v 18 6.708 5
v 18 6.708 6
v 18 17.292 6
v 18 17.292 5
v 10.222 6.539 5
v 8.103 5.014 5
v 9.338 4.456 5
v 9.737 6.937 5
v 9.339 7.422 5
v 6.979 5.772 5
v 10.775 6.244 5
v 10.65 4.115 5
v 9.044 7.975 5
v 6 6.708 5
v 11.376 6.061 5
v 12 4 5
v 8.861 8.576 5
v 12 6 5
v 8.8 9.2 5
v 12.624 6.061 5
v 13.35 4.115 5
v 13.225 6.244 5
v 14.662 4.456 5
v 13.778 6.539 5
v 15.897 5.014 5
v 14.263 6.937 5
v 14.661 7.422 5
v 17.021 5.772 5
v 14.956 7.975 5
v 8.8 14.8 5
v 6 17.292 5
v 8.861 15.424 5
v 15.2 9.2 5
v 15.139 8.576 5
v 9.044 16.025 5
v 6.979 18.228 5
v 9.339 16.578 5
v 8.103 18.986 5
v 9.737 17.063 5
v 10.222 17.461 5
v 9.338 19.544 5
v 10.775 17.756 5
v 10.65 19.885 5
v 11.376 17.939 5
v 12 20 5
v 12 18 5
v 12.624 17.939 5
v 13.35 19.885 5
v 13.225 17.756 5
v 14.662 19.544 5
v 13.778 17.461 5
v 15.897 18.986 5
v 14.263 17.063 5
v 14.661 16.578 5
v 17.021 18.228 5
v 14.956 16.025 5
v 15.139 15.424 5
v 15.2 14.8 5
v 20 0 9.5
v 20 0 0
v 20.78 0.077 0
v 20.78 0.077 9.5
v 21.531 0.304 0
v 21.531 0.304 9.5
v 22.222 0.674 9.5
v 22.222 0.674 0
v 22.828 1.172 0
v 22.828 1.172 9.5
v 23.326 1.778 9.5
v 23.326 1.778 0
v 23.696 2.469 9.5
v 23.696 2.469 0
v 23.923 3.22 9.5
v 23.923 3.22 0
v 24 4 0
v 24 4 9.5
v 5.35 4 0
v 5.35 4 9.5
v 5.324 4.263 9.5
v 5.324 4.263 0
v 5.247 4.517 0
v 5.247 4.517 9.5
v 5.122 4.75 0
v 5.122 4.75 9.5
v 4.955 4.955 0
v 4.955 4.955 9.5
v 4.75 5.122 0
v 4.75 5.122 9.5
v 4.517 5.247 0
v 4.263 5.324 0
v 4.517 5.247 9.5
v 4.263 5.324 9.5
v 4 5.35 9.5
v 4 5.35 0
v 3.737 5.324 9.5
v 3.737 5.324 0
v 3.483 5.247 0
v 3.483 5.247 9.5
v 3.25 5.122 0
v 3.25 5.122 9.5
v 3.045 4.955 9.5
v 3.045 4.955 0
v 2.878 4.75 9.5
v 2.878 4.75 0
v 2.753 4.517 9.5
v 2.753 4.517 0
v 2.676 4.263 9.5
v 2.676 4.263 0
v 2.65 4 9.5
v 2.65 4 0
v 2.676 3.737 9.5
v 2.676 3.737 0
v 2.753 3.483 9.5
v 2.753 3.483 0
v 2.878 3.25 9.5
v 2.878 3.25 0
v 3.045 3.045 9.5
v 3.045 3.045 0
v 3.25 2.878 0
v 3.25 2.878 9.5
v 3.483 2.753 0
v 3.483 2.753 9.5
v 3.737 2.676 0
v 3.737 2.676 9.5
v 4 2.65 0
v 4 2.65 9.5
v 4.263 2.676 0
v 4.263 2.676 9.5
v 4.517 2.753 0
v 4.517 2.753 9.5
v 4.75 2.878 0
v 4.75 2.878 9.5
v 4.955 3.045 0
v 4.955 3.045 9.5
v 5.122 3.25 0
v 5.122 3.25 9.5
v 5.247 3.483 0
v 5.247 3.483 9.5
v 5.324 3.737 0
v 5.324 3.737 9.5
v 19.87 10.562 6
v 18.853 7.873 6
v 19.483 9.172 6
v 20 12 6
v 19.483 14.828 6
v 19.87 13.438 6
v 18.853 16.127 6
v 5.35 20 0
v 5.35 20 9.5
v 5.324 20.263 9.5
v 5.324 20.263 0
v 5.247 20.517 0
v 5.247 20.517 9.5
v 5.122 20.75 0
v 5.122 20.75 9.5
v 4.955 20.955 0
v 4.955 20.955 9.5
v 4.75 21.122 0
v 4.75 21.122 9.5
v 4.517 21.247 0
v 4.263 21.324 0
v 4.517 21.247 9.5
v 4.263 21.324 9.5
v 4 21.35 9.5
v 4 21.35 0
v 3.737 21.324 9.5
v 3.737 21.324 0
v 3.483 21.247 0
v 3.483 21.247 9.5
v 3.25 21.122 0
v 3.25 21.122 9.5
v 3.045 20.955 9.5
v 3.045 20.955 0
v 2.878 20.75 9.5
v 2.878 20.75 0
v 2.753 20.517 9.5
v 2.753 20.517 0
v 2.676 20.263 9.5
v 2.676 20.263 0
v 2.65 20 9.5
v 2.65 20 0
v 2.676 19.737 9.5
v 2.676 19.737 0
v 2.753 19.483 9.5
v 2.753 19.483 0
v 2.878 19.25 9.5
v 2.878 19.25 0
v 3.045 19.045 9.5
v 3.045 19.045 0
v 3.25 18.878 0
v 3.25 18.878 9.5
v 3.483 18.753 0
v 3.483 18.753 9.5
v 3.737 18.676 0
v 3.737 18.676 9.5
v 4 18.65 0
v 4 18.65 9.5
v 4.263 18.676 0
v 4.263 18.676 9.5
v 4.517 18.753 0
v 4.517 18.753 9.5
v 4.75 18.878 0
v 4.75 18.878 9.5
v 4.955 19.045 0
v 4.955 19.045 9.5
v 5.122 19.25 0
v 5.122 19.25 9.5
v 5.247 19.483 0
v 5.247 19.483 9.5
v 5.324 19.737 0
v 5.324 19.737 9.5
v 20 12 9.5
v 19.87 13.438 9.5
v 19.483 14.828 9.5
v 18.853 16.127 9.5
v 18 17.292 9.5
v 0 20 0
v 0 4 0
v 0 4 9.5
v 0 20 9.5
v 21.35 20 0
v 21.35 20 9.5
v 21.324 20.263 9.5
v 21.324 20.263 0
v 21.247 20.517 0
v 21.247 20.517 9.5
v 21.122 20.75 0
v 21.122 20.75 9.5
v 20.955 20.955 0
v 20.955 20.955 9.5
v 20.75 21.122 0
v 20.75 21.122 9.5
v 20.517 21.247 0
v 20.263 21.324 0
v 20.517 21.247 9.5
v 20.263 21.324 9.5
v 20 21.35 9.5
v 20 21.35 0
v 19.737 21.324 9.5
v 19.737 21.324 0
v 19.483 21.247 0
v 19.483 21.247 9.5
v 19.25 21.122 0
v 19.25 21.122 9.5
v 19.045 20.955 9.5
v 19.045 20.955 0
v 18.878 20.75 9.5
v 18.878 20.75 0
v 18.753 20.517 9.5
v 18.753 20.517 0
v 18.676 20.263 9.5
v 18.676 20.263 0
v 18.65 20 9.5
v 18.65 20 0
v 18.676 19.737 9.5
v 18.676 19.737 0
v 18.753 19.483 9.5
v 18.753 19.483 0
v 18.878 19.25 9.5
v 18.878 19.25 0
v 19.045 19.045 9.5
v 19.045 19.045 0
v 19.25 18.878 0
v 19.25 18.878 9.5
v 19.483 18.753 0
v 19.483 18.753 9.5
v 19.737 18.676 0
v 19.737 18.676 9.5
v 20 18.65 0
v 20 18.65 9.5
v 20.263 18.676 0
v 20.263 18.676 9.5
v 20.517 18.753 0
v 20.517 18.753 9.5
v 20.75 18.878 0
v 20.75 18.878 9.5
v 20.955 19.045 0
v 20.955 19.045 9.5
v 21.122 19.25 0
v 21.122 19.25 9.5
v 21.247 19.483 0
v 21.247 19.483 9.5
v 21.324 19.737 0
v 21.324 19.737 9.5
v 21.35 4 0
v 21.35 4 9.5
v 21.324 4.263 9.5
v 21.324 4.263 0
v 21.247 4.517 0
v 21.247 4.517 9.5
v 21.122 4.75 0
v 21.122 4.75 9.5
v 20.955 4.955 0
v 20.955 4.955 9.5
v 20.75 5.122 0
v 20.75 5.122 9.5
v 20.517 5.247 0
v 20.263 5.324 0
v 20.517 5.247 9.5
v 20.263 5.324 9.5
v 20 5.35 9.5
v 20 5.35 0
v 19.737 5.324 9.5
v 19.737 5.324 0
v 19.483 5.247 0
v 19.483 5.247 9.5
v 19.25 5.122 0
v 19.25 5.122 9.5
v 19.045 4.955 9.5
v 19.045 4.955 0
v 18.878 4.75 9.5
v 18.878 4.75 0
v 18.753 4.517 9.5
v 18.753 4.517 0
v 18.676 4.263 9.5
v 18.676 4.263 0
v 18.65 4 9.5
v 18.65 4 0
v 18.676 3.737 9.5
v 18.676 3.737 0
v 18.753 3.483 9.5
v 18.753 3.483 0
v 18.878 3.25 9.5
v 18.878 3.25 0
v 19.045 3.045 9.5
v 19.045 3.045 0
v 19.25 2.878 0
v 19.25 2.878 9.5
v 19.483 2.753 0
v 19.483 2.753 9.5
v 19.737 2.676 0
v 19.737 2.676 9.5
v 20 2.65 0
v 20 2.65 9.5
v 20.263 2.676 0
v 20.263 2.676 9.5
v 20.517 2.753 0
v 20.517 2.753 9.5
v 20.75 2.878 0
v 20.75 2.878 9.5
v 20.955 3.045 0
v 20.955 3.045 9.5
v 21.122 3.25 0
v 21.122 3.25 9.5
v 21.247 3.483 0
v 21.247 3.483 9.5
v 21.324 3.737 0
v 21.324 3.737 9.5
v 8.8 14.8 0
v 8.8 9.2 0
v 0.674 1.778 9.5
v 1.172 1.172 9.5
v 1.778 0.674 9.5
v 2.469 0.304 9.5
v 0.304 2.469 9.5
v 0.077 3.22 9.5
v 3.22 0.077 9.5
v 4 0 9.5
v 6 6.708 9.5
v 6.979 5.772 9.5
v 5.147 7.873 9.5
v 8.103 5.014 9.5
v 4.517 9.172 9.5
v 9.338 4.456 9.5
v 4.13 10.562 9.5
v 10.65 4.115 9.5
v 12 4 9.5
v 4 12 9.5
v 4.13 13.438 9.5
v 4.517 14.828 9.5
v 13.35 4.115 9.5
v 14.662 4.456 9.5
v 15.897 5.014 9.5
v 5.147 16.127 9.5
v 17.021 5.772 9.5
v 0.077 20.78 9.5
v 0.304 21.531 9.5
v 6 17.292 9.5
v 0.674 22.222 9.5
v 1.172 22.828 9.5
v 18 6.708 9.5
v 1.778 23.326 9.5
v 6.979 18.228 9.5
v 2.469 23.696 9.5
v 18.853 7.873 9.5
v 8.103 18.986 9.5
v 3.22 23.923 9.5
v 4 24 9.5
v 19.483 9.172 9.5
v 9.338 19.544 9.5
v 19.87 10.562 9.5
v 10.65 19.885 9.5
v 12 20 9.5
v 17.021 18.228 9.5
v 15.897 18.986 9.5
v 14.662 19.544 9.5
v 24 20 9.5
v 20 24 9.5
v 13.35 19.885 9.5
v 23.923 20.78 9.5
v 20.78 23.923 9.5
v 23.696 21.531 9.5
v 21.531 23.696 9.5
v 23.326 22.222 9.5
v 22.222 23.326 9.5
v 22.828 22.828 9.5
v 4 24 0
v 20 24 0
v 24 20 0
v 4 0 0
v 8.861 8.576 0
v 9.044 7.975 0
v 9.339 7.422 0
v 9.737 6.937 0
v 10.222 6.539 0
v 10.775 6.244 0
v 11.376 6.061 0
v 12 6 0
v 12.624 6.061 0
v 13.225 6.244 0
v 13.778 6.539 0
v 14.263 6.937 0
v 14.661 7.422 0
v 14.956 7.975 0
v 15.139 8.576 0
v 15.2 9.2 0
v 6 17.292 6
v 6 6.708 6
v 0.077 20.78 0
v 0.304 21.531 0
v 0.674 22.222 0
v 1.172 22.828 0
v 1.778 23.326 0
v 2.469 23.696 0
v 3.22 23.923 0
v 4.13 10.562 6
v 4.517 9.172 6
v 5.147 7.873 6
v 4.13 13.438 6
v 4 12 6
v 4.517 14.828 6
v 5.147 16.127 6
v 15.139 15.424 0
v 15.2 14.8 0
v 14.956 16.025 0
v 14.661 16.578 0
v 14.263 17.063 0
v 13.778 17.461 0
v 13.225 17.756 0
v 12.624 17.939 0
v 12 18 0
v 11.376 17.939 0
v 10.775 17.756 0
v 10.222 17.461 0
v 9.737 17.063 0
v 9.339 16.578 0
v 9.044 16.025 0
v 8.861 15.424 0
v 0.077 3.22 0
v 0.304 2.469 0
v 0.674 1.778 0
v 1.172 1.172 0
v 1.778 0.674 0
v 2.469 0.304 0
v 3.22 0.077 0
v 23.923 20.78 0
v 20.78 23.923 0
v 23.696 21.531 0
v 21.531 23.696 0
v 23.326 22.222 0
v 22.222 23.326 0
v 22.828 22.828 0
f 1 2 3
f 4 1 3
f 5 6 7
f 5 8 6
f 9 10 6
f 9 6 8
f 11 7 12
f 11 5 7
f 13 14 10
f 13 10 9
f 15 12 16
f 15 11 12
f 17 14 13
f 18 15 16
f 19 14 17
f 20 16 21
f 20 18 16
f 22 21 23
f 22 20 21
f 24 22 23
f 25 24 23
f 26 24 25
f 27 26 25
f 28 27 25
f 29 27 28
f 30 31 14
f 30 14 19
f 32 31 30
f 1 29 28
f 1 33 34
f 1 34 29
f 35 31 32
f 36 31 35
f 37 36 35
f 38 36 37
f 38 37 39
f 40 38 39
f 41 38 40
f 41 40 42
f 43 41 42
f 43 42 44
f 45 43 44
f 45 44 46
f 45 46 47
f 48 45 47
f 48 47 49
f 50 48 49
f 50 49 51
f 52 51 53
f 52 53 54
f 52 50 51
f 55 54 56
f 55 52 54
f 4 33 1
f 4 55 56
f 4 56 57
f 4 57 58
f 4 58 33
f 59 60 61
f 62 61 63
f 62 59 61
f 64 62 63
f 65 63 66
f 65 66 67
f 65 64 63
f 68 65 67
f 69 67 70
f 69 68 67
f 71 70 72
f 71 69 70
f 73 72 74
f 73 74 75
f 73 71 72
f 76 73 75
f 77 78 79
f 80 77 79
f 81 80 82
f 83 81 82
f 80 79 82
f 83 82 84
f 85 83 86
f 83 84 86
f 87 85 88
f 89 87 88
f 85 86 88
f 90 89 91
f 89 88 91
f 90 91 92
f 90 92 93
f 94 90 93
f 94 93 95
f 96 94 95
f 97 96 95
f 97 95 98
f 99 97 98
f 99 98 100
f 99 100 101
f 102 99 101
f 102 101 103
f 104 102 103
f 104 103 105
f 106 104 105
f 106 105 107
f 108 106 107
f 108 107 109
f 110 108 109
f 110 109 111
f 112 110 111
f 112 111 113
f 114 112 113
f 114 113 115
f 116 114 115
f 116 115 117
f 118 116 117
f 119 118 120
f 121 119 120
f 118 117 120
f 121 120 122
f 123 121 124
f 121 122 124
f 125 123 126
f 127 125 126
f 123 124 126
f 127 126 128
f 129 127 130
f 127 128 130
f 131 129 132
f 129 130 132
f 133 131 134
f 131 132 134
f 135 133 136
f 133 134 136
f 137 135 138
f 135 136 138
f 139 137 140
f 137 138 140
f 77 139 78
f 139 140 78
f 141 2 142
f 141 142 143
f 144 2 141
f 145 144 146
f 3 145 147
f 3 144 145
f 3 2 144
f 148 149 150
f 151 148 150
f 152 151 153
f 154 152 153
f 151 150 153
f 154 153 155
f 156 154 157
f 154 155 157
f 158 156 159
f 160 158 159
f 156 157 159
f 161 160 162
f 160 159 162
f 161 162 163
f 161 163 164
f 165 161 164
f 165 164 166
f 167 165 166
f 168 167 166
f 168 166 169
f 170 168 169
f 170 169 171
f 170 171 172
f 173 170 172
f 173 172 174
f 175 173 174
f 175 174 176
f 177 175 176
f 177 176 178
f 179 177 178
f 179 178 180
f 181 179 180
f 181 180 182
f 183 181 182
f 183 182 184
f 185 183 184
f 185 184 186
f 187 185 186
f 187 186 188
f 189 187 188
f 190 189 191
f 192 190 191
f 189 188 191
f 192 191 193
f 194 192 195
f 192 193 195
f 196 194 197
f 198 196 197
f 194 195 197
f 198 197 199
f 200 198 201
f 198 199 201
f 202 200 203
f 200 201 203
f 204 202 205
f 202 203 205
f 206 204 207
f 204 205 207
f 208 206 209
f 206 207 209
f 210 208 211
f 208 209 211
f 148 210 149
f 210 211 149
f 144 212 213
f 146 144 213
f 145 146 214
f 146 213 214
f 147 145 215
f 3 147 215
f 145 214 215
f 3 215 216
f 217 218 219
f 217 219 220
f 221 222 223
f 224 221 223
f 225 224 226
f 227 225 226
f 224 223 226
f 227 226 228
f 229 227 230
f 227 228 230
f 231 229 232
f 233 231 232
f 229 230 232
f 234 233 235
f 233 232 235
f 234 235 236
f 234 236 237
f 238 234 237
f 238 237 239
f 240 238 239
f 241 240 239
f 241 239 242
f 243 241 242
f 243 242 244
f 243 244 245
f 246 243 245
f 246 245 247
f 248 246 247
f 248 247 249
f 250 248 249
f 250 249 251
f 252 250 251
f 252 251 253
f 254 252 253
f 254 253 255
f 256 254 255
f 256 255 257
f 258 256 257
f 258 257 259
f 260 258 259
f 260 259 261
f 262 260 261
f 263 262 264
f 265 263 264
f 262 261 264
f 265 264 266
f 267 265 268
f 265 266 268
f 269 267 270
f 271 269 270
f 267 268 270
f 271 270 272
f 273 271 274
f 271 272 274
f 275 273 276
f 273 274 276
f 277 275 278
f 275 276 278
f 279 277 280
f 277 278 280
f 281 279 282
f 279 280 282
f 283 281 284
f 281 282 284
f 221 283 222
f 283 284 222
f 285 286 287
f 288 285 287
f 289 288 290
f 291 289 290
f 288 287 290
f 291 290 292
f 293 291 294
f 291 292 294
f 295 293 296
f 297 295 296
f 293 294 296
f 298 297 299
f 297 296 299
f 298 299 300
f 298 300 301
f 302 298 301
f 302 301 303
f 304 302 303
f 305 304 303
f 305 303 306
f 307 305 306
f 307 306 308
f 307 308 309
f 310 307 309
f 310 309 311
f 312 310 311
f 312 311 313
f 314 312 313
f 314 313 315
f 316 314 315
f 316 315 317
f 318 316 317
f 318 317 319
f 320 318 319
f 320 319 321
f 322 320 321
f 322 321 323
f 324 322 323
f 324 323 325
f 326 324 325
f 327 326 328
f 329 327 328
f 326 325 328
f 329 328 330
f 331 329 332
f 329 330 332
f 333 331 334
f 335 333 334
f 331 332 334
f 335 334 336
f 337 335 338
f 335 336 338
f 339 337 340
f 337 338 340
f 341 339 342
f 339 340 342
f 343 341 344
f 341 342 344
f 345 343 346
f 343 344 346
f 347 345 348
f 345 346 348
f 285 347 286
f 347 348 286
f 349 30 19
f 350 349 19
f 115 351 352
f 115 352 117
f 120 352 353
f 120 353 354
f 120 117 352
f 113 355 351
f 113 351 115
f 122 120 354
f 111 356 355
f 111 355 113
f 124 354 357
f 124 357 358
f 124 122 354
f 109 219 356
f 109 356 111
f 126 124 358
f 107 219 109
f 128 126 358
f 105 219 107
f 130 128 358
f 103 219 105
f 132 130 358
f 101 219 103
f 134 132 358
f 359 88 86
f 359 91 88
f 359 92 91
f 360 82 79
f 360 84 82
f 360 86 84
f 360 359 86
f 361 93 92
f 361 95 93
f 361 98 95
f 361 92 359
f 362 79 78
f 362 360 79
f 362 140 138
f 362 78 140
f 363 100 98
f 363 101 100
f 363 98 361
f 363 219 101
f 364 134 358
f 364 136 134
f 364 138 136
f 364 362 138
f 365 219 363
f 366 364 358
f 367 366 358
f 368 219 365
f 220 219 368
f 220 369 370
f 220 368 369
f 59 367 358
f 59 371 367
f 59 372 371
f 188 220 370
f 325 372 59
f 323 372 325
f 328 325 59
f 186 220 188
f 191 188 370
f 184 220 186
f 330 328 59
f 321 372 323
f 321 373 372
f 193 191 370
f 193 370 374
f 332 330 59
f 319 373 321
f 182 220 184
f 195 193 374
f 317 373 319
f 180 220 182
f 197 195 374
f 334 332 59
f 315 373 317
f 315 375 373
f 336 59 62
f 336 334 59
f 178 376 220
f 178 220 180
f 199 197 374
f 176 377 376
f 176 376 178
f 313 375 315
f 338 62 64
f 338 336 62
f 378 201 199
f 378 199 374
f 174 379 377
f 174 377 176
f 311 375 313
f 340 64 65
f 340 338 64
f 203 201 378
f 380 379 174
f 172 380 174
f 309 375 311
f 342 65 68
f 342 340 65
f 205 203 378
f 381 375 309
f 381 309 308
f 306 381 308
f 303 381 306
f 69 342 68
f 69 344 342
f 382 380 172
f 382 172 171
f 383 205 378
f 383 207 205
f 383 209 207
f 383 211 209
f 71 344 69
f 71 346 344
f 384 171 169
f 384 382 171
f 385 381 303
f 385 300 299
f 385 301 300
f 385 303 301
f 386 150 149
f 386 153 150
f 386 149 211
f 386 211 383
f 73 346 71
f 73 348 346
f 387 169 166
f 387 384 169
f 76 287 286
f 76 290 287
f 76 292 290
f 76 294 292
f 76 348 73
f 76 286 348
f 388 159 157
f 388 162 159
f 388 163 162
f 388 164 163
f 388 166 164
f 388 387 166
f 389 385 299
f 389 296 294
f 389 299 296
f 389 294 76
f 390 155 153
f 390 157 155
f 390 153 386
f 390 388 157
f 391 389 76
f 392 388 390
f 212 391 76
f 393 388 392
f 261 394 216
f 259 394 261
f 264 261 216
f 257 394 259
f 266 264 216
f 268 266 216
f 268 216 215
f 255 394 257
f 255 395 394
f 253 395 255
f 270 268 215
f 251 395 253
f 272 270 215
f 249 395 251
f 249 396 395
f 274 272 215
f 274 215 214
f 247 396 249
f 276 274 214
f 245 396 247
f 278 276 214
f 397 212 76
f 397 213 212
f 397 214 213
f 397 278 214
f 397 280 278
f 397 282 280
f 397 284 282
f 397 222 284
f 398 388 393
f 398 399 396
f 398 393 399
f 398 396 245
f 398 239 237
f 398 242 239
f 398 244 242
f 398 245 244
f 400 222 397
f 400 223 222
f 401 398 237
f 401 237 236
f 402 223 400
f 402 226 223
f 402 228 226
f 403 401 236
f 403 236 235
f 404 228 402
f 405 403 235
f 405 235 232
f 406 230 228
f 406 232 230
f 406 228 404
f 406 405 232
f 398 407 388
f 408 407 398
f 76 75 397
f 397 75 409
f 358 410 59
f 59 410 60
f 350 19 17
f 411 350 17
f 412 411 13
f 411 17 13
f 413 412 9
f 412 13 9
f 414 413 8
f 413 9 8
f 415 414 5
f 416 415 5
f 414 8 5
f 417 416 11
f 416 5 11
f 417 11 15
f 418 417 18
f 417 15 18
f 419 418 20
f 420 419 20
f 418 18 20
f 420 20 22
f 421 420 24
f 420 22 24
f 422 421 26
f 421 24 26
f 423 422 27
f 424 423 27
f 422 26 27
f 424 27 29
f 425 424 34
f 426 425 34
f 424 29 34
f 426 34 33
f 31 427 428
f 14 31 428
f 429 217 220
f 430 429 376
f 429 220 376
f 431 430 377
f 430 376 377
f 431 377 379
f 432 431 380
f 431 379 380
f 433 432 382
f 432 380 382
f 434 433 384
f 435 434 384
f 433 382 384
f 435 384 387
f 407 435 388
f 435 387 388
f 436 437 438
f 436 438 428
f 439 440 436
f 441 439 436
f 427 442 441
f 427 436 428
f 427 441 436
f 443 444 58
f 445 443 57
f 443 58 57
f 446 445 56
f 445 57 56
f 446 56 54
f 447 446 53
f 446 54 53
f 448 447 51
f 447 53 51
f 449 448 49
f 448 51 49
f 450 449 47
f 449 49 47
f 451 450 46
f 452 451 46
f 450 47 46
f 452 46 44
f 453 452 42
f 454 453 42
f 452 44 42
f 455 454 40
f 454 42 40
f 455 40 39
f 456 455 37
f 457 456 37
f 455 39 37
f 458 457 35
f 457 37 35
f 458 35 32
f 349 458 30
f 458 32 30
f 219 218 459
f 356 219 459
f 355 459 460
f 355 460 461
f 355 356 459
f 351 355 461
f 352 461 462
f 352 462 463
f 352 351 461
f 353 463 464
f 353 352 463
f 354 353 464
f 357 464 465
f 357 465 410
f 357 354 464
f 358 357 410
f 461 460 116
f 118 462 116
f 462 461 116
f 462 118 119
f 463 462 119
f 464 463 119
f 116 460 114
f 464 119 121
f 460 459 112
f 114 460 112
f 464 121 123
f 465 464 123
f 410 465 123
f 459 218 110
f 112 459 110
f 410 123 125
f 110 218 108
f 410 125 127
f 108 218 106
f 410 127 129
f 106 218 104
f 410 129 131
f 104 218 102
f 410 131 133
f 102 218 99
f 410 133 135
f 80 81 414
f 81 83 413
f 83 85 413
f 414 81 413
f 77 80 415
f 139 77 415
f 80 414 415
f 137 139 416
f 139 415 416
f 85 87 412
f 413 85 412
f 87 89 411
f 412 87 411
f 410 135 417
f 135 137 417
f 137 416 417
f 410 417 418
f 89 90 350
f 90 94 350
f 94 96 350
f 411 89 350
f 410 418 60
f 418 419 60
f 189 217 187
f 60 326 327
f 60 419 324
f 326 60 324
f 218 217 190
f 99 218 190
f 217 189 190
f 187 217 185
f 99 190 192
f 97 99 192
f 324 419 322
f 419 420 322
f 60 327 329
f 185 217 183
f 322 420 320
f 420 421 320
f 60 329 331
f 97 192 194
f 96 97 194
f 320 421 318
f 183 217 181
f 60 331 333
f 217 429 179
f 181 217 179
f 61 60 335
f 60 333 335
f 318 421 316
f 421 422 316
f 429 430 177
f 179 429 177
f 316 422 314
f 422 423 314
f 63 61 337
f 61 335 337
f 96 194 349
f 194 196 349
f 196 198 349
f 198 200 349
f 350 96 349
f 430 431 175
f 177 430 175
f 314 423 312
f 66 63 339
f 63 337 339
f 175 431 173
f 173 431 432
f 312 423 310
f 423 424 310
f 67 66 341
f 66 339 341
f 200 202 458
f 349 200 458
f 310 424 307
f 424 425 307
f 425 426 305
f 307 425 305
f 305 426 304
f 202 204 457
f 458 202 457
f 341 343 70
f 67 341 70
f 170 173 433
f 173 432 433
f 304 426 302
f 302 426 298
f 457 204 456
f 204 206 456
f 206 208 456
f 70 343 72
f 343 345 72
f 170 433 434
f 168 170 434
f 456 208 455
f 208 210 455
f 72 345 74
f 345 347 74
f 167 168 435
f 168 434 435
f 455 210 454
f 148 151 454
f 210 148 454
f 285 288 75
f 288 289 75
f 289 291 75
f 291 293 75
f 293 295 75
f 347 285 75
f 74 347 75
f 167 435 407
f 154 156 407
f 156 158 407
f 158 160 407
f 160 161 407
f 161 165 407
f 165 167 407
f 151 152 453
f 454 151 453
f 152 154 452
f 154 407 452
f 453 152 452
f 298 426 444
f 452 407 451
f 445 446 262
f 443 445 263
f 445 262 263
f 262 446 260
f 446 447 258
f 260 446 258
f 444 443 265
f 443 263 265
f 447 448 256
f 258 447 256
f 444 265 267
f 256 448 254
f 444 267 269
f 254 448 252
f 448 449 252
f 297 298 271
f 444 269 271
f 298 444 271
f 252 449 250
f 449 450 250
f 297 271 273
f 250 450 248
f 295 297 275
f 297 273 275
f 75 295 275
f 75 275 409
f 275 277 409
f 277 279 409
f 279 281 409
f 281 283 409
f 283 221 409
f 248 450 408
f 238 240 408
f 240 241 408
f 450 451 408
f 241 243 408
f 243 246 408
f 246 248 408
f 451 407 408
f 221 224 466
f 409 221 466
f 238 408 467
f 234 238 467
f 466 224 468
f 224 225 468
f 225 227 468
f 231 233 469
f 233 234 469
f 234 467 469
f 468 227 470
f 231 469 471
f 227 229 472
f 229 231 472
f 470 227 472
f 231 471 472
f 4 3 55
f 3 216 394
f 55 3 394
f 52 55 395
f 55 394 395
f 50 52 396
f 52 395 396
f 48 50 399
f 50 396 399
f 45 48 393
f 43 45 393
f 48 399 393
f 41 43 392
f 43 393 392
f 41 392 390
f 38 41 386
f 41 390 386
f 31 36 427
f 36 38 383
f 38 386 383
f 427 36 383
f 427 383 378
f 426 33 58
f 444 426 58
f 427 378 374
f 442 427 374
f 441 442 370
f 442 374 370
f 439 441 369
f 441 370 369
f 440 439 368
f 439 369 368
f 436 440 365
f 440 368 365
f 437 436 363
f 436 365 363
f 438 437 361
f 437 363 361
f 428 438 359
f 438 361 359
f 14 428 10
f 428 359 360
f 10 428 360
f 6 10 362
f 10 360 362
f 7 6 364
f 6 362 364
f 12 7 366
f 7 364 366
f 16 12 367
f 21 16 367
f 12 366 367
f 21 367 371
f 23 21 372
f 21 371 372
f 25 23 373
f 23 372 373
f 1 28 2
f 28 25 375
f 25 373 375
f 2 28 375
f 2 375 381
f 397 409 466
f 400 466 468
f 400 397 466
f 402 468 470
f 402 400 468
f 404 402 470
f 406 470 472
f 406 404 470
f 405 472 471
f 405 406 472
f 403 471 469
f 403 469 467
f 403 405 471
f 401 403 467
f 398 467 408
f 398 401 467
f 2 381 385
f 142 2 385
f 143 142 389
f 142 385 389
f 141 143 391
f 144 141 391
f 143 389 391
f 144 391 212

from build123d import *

# Parameters (mm, degrees)
F0_W      = 24
F0_H      = 24
F1_DEPTH  = 9.5
F4_R      = 4
F7_DEPTH  = 9.501
F8_DEPTH  = 4.5
F9_DEPTH  = 3.5
F5_R      = 1.35
F10_DEPTH = 9.501


with BuildPart() as f1:
    # F0 (on Top) → F1 (new body)
    with BuildSketch(Plane.XY):
        with Locations((12, 12)):
            Rectangle(F0_W, F0_H)
    extrude(amount=F1_DEPTH)

    # F4
    f4_edges = [f1.edges().sort_by_distance(p)[0] for p in [
        (0, 0, 4.75),
        (24, 0, 4.75),
        (24, 24, 4.75),
        (0, 24, 4.75),
    ]]
    fillet(f4_edges, radius=F4_R)

    # F6 (on face) → F7 (cut, through all)
    with BuildSketch(Plane.XY.offset(9.5)):
        with BuildLine():
            ThreePointArc((15.2, 14.8), (12, 18), (8.8, 14.8))
            Line((8.8, 14.8), (8.8, 9.2))
            ThreePointArc((8.8, 9.2), (12, 6), (15.2, 9.2))
            Line((15.2, 9.2), (15.2, 14.8))
        make_face()
    extrude(amount=-F7_DEPTH, mode=Mode.SUBTRACT)

    # F6 (on face) → F8 (cut, through all)
    with BuildSketch(Plane.XY.offset(9.5)):
        with BuildLine():
            Line((18, 12), (18, 17.291503))
            ThreePointArc((18, 17.291503), (12, 20), (6, 17.291503))
            Line((6, 17.291503), (6, 12))
            Line((6, 12), (6, 6.708497))
            ThreePointArc((6, 6.708497), (12, 4), (18, 6.708497))
            Line((18, 6.708497), (18, 12))
        make_face()
        with BuildLine():
            Line((8.8, 9.2), (8.8, 14.8))
            ThreePointArc((8.8, 14.8), (12, 18), (15.2, 14.8))
            Line((15.2, 14.8), (15.2, 9.2))
            ThreePointArc((15.2, 9.2), (12, 6), (8.8, 9.2))
        make_face(mode=Mode.SUBTRACT)
    extrude(amount=-F8_DEPTH, mode=Mode.SUBTRACT)

    # F6 (on face) → F9 (cut, through all)
    with BuildSketch(Plane.XY.offset(9.5)):
        with BuildLine():
            Line((6, 12), (6, 17.291503))
            ThreePointArc((6, 17.291503), (4, 12), (6, 6.708497))
            Line((6, 6.708497), (6, 12))
        make_face()
        with BuildLine():
            ThreePointArc((18, 6.708497), (19.483315, 9.171573), (20, 12))
            ThreePointArc((20, 12), (19.483315, 14.828427), (18, 17.291503))
            Line((18, 17.291503), (18, 12))
            Line((18, 12), (18, 6.708497))
        make_face()
    extrude(amount=-F9_DEPTH, mode=Mode.SUBTRACT)

    # F5 (on face) → F10 (cut, through all)
    with BuildSketch(Plane.XY.offset(9.5)):
        with Locations((4, 4)):
            Circle(F5_R)
        with Locations((4, 20)):
            Circle(F5_R)
        with Locations((20, 4)):
            Circle(F5_R)
        with Locations((20, 20)):
            Circle(F5_R)
    extrude(amount=-F10_DEPTH, mode=Mode.SUBTRACT)


solid = f1.part
